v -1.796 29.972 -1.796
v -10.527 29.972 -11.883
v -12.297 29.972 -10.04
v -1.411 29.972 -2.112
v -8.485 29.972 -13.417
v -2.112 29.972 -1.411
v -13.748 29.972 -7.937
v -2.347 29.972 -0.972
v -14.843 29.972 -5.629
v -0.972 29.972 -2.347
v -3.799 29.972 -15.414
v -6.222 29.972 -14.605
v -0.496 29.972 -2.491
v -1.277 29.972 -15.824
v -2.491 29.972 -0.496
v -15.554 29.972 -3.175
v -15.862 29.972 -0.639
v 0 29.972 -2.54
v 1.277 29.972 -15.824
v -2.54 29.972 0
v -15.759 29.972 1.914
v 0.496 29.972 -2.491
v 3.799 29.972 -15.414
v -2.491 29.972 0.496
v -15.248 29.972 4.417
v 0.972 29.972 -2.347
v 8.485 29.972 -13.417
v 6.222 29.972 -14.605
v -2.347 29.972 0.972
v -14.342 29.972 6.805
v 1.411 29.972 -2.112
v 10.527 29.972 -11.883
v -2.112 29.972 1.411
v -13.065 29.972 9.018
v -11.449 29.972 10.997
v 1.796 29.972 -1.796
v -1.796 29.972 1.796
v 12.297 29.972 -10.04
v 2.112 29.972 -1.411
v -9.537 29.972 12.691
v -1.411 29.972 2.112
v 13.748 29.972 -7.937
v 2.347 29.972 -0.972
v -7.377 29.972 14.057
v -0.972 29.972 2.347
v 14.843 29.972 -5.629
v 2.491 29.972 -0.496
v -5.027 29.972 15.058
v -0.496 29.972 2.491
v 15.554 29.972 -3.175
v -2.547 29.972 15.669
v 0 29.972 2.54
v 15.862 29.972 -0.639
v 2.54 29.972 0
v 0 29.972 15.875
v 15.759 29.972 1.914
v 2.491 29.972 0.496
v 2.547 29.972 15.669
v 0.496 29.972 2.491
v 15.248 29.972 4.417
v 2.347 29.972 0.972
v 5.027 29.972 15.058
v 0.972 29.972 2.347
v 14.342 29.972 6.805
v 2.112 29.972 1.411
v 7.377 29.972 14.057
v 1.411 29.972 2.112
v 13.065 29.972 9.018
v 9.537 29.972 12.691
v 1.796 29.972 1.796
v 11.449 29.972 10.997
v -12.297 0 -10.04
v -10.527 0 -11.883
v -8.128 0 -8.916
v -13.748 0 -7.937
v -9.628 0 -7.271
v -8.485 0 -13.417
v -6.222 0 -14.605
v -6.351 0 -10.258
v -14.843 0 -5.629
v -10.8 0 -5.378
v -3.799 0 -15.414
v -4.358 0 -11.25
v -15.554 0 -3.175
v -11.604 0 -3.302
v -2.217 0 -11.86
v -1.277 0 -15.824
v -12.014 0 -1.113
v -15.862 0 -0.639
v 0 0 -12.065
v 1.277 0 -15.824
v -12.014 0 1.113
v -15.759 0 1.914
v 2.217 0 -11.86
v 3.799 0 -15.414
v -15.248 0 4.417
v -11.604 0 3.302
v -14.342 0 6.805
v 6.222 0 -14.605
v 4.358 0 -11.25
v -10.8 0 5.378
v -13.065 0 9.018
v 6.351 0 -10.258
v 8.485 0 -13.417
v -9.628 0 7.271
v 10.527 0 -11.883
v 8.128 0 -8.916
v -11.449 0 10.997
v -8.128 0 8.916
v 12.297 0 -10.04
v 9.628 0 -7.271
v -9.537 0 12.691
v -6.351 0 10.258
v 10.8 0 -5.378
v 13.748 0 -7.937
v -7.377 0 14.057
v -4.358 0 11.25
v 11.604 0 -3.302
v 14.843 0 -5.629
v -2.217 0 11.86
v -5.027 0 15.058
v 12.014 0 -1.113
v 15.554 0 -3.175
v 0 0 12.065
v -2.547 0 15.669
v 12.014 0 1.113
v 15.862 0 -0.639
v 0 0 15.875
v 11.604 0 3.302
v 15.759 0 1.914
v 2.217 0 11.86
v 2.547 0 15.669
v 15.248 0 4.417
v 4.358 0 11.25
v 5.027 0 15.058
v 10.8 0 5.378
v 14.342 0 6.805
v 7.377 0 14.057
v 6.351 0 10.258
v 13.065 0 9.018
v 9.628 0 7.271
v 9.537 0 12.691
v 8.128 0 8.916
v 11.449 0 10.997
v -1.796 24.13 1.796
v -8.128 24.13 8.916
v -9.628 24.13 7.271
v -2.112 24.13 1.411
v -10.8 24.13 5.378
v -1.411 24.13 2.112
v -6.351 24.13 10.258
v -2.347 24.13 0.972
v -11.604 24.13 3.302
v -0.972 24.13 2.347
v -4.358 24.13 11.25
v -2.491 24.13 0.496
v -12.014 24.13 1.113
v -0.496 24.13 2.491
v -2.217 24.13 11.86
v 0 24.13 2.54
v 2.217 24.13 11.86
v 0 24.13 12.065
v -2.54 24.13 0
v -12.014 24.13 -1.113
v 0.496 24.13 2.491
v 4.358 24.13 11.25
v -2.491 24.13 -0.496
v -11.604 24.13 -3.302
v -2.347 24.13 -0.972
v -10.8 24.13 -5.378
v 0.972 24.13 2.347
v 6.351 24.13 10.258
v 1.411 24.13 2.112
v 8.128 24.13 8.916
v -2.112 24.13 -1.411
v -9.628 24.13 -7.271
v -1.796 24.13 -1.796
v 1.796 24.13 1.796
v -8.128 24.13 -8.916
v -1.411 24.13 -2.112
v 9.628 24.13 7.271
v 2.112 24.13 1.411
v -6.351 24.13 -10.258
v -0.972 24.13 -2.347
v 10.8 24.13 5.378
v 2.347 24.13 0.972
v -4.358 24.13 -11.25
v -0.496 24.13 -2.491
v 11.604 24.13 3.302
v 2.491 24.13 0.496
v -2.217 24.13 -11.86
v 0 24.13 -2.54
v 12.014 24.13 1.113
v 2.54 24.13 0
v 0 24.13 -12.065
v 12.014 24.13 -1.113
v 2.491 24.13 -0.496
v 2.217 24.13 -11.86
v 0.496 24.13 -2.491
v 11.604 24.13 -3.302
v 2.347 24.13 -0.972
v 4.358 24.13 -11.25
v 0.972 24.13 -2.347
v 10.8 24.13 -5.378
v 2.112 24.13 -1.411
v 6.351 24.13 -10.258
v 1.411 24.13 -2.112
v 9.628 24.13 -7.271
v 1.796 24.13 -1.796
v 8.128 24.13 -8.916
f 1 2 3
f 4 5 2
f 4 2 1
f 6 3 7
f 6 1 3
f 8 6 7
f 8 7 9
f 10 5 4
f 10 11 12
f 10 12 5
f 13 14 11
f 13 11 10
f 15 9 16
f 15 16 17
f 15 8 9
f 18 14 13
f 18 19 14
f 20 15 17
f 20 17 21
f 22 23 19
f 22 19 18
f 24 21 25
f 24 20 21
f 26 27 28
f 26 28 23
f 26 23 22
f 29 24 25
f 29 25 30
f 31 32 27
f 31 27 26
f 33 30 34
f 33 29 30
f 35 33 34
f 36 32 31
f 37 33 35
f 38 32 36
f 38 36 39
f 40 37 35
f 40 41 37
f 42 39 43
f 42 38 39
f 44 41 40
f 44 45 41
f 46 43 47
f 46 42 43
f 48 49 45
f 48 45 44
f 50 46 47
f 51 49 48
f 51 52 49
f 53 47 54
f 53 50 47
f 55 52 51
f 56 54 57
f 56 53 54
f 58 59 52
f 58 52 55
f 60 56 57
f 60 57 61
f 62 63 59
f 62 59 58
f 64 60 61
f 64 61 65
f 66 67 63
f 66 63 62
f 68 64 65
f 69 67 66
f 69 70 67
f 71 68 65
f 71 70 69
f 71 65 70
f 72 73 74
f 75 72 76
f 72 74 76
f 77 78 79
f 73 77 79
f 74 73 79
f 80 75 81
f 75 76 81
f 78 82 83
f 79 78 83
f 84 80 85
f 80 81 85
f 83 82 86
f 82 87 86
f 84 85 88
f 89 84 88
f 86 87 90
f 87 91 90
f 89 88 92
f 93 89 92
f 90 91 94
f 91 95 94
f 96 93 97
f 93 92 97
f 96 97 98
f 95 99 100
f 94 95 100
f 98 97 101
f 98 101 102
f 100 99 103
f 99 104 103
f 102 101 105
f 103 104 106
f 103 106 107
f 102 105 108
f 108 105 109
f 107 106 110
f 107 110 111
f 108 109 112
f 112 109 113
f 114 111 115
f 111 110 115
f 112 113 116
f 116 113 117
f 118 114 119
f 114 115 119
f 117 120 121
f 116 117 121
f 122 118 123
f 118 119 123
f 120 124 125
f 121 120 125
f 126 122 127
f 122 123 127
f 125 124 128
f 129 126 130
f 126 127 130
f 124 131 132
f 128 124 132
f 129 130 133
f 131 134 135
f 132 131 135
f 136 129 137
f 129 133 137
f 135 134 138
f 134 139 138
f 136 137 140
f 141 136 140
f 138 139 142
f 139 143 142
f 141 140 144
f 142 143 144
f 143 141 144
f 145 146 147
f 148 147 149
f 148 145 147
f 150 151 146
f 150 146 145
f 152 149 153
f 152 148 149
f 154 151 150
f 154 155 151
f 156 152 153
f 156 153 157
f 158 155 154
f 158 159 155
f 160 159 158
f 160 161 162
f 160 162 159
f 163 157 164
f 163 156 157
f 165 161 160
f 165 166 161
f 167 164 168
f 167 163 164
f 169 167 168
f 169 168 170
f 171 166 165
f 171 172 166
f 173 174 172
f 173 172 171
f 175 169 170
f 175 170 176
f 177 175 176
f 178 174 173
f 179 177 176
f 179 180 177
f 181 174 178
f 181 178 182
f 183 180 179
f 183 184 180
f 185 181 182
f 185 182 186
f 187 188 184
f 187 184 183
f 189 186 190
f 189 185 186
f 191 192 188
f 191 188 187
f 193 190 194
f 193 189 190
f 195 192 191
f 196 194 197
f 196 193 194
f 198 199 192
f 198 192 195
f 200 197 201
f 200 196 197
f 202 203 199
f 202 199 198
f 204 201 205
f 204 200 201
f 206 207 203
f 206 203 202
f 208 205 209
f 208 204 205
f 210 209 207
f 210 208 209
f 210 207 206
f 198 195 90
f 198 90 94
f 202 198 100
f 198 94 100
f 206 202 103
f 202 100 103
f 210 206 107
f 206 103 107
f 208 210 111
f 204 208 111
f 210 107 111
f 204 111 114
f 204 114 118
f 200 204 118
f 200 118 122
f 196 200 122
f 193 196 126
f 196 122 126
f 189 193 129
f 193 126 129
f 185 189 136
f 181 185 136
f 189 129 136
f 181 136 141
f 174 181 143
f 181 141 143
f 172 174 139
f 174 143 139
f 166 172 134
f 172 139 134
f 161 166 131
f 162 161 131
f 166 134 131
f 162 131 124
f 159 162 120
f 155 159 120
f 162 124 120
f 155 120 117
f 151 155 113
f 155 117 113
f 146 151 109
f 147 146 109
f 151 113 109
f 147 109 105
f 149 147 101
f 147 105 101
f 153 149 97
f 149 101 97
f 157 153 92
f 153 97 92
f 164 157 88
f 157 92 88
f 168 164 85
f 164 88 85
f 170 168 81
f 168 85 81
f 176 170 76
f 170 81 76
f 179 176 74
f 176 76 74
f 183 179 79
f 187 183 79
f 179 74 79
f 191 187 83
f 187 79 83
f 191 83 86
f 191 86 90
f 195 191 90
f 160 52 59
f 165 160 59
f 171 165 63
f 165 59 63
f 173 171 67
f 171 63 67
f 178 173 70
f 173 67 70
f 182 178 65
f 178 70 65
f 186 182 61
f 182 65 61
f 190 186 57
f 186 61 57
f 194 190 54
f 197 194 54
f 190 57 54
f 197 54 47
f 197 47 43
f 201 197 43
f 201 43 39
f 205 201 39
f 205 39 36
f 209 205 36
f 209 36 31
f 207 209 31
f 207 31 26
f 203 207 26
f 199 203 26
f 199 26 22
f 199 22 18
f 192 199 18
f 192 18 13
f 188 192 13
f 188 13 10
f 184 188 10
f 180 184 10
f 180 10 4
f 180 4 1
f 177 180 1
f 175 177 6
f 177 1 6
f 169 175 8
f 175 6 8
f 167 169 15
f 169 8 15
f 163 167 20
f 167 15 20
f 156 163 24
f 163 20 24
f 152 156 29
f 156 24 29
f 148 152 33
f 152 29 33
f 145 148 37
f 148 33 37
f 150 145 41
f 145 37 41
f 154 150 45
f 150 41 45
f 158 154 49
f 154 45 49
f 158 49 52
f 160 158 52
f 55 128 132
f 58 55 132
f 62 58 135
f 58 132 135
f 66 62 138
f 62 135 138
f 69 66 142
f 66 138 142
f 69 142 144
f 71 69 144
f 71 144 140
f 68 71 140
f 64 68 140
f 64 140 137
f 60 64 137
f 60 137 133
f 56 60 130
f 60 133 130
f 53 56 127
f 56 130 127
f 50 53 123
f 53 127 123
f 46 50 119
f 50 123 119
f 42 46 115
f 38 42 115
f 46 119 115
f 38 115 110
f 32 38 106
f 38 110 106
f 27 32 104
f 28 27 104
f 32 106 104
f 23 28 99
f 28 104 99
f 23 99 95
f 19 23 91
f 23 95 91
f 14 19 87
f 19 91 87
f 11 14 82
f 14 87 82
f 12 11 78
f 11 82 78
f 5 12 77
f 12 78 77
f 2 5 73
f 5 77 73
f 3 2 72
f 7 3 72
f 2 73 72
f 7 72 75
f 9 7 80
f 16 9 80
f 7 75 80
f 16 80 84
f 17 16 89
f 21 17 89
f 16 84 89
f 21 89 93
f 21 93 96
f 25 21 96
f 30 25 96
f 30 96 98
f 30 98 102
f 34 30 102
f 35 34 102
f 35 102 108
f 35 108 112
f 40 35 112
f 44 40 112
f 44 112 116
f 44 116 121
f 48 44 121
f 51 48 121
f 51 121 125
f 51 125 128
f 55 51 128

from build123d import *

# Parameters (mm, degrees)
SKETCH2_R           = 15.875
BOSS_EXTRUDE1_DEPTH = 29.972
SKETCH3_R           = 12.065
CUT_EXTRUDE1_DEPTH  = 24.13
CUT_EXTRUDE2_REACH  = 39.448
SKETCH4_R           = 2.54


with BuildPart() as part:
    # Sketch2 → Boss-Extrude1 (new body)
    with BuildSketch(Plane(origin=(0, 0, 0), x_dir=(1, 0, 0), z_dir=(0, 1, 0))):
        with Locations(Location((0, 0, 0), (0, 0, 270))):
            Circle(SKETCH2_R)
    extrude(amount=BOSS_EXTRUDE1_DEPTH)

    # Sketch3 → Cut-Extrude1 (cut)
    with BuildSketch(Plane.XZ):
        with Locations(Location((0, 0, 0), (0, 0, 270))):
            Circle(SKETCH3_R)
    extrude(amount=-CUT_EXTRUDE1_DEPTH, mode=Mode.SUBTRACT)

    # Sketch4 → Cut-Extrude2 (cut, up to next)
    with BuildSketch(Plane(origin=(0, 29.972, 0), x_dir=(1, 0, 0), z_dir=(0, 1, 0)), mode=Mode.PRIVATE) as cut_extrude2_sk1:
        with Locations(Location((0, 0, 0), (0, 0, 270))):
            Circle(SKETCH4_R)
    cut_extrude2_tool1 = extrude(cut_extrude2_sk1.sketch, amount=-CUT_EXTRUDE2_REACH, mode=Mode.PRIVATE) & part.part
    add(cut_extrude2_tool1.solids().sort_by_distance((0, 29.972, 0))[0], mode=Mode.SUBTRACT)


solid = part.part
